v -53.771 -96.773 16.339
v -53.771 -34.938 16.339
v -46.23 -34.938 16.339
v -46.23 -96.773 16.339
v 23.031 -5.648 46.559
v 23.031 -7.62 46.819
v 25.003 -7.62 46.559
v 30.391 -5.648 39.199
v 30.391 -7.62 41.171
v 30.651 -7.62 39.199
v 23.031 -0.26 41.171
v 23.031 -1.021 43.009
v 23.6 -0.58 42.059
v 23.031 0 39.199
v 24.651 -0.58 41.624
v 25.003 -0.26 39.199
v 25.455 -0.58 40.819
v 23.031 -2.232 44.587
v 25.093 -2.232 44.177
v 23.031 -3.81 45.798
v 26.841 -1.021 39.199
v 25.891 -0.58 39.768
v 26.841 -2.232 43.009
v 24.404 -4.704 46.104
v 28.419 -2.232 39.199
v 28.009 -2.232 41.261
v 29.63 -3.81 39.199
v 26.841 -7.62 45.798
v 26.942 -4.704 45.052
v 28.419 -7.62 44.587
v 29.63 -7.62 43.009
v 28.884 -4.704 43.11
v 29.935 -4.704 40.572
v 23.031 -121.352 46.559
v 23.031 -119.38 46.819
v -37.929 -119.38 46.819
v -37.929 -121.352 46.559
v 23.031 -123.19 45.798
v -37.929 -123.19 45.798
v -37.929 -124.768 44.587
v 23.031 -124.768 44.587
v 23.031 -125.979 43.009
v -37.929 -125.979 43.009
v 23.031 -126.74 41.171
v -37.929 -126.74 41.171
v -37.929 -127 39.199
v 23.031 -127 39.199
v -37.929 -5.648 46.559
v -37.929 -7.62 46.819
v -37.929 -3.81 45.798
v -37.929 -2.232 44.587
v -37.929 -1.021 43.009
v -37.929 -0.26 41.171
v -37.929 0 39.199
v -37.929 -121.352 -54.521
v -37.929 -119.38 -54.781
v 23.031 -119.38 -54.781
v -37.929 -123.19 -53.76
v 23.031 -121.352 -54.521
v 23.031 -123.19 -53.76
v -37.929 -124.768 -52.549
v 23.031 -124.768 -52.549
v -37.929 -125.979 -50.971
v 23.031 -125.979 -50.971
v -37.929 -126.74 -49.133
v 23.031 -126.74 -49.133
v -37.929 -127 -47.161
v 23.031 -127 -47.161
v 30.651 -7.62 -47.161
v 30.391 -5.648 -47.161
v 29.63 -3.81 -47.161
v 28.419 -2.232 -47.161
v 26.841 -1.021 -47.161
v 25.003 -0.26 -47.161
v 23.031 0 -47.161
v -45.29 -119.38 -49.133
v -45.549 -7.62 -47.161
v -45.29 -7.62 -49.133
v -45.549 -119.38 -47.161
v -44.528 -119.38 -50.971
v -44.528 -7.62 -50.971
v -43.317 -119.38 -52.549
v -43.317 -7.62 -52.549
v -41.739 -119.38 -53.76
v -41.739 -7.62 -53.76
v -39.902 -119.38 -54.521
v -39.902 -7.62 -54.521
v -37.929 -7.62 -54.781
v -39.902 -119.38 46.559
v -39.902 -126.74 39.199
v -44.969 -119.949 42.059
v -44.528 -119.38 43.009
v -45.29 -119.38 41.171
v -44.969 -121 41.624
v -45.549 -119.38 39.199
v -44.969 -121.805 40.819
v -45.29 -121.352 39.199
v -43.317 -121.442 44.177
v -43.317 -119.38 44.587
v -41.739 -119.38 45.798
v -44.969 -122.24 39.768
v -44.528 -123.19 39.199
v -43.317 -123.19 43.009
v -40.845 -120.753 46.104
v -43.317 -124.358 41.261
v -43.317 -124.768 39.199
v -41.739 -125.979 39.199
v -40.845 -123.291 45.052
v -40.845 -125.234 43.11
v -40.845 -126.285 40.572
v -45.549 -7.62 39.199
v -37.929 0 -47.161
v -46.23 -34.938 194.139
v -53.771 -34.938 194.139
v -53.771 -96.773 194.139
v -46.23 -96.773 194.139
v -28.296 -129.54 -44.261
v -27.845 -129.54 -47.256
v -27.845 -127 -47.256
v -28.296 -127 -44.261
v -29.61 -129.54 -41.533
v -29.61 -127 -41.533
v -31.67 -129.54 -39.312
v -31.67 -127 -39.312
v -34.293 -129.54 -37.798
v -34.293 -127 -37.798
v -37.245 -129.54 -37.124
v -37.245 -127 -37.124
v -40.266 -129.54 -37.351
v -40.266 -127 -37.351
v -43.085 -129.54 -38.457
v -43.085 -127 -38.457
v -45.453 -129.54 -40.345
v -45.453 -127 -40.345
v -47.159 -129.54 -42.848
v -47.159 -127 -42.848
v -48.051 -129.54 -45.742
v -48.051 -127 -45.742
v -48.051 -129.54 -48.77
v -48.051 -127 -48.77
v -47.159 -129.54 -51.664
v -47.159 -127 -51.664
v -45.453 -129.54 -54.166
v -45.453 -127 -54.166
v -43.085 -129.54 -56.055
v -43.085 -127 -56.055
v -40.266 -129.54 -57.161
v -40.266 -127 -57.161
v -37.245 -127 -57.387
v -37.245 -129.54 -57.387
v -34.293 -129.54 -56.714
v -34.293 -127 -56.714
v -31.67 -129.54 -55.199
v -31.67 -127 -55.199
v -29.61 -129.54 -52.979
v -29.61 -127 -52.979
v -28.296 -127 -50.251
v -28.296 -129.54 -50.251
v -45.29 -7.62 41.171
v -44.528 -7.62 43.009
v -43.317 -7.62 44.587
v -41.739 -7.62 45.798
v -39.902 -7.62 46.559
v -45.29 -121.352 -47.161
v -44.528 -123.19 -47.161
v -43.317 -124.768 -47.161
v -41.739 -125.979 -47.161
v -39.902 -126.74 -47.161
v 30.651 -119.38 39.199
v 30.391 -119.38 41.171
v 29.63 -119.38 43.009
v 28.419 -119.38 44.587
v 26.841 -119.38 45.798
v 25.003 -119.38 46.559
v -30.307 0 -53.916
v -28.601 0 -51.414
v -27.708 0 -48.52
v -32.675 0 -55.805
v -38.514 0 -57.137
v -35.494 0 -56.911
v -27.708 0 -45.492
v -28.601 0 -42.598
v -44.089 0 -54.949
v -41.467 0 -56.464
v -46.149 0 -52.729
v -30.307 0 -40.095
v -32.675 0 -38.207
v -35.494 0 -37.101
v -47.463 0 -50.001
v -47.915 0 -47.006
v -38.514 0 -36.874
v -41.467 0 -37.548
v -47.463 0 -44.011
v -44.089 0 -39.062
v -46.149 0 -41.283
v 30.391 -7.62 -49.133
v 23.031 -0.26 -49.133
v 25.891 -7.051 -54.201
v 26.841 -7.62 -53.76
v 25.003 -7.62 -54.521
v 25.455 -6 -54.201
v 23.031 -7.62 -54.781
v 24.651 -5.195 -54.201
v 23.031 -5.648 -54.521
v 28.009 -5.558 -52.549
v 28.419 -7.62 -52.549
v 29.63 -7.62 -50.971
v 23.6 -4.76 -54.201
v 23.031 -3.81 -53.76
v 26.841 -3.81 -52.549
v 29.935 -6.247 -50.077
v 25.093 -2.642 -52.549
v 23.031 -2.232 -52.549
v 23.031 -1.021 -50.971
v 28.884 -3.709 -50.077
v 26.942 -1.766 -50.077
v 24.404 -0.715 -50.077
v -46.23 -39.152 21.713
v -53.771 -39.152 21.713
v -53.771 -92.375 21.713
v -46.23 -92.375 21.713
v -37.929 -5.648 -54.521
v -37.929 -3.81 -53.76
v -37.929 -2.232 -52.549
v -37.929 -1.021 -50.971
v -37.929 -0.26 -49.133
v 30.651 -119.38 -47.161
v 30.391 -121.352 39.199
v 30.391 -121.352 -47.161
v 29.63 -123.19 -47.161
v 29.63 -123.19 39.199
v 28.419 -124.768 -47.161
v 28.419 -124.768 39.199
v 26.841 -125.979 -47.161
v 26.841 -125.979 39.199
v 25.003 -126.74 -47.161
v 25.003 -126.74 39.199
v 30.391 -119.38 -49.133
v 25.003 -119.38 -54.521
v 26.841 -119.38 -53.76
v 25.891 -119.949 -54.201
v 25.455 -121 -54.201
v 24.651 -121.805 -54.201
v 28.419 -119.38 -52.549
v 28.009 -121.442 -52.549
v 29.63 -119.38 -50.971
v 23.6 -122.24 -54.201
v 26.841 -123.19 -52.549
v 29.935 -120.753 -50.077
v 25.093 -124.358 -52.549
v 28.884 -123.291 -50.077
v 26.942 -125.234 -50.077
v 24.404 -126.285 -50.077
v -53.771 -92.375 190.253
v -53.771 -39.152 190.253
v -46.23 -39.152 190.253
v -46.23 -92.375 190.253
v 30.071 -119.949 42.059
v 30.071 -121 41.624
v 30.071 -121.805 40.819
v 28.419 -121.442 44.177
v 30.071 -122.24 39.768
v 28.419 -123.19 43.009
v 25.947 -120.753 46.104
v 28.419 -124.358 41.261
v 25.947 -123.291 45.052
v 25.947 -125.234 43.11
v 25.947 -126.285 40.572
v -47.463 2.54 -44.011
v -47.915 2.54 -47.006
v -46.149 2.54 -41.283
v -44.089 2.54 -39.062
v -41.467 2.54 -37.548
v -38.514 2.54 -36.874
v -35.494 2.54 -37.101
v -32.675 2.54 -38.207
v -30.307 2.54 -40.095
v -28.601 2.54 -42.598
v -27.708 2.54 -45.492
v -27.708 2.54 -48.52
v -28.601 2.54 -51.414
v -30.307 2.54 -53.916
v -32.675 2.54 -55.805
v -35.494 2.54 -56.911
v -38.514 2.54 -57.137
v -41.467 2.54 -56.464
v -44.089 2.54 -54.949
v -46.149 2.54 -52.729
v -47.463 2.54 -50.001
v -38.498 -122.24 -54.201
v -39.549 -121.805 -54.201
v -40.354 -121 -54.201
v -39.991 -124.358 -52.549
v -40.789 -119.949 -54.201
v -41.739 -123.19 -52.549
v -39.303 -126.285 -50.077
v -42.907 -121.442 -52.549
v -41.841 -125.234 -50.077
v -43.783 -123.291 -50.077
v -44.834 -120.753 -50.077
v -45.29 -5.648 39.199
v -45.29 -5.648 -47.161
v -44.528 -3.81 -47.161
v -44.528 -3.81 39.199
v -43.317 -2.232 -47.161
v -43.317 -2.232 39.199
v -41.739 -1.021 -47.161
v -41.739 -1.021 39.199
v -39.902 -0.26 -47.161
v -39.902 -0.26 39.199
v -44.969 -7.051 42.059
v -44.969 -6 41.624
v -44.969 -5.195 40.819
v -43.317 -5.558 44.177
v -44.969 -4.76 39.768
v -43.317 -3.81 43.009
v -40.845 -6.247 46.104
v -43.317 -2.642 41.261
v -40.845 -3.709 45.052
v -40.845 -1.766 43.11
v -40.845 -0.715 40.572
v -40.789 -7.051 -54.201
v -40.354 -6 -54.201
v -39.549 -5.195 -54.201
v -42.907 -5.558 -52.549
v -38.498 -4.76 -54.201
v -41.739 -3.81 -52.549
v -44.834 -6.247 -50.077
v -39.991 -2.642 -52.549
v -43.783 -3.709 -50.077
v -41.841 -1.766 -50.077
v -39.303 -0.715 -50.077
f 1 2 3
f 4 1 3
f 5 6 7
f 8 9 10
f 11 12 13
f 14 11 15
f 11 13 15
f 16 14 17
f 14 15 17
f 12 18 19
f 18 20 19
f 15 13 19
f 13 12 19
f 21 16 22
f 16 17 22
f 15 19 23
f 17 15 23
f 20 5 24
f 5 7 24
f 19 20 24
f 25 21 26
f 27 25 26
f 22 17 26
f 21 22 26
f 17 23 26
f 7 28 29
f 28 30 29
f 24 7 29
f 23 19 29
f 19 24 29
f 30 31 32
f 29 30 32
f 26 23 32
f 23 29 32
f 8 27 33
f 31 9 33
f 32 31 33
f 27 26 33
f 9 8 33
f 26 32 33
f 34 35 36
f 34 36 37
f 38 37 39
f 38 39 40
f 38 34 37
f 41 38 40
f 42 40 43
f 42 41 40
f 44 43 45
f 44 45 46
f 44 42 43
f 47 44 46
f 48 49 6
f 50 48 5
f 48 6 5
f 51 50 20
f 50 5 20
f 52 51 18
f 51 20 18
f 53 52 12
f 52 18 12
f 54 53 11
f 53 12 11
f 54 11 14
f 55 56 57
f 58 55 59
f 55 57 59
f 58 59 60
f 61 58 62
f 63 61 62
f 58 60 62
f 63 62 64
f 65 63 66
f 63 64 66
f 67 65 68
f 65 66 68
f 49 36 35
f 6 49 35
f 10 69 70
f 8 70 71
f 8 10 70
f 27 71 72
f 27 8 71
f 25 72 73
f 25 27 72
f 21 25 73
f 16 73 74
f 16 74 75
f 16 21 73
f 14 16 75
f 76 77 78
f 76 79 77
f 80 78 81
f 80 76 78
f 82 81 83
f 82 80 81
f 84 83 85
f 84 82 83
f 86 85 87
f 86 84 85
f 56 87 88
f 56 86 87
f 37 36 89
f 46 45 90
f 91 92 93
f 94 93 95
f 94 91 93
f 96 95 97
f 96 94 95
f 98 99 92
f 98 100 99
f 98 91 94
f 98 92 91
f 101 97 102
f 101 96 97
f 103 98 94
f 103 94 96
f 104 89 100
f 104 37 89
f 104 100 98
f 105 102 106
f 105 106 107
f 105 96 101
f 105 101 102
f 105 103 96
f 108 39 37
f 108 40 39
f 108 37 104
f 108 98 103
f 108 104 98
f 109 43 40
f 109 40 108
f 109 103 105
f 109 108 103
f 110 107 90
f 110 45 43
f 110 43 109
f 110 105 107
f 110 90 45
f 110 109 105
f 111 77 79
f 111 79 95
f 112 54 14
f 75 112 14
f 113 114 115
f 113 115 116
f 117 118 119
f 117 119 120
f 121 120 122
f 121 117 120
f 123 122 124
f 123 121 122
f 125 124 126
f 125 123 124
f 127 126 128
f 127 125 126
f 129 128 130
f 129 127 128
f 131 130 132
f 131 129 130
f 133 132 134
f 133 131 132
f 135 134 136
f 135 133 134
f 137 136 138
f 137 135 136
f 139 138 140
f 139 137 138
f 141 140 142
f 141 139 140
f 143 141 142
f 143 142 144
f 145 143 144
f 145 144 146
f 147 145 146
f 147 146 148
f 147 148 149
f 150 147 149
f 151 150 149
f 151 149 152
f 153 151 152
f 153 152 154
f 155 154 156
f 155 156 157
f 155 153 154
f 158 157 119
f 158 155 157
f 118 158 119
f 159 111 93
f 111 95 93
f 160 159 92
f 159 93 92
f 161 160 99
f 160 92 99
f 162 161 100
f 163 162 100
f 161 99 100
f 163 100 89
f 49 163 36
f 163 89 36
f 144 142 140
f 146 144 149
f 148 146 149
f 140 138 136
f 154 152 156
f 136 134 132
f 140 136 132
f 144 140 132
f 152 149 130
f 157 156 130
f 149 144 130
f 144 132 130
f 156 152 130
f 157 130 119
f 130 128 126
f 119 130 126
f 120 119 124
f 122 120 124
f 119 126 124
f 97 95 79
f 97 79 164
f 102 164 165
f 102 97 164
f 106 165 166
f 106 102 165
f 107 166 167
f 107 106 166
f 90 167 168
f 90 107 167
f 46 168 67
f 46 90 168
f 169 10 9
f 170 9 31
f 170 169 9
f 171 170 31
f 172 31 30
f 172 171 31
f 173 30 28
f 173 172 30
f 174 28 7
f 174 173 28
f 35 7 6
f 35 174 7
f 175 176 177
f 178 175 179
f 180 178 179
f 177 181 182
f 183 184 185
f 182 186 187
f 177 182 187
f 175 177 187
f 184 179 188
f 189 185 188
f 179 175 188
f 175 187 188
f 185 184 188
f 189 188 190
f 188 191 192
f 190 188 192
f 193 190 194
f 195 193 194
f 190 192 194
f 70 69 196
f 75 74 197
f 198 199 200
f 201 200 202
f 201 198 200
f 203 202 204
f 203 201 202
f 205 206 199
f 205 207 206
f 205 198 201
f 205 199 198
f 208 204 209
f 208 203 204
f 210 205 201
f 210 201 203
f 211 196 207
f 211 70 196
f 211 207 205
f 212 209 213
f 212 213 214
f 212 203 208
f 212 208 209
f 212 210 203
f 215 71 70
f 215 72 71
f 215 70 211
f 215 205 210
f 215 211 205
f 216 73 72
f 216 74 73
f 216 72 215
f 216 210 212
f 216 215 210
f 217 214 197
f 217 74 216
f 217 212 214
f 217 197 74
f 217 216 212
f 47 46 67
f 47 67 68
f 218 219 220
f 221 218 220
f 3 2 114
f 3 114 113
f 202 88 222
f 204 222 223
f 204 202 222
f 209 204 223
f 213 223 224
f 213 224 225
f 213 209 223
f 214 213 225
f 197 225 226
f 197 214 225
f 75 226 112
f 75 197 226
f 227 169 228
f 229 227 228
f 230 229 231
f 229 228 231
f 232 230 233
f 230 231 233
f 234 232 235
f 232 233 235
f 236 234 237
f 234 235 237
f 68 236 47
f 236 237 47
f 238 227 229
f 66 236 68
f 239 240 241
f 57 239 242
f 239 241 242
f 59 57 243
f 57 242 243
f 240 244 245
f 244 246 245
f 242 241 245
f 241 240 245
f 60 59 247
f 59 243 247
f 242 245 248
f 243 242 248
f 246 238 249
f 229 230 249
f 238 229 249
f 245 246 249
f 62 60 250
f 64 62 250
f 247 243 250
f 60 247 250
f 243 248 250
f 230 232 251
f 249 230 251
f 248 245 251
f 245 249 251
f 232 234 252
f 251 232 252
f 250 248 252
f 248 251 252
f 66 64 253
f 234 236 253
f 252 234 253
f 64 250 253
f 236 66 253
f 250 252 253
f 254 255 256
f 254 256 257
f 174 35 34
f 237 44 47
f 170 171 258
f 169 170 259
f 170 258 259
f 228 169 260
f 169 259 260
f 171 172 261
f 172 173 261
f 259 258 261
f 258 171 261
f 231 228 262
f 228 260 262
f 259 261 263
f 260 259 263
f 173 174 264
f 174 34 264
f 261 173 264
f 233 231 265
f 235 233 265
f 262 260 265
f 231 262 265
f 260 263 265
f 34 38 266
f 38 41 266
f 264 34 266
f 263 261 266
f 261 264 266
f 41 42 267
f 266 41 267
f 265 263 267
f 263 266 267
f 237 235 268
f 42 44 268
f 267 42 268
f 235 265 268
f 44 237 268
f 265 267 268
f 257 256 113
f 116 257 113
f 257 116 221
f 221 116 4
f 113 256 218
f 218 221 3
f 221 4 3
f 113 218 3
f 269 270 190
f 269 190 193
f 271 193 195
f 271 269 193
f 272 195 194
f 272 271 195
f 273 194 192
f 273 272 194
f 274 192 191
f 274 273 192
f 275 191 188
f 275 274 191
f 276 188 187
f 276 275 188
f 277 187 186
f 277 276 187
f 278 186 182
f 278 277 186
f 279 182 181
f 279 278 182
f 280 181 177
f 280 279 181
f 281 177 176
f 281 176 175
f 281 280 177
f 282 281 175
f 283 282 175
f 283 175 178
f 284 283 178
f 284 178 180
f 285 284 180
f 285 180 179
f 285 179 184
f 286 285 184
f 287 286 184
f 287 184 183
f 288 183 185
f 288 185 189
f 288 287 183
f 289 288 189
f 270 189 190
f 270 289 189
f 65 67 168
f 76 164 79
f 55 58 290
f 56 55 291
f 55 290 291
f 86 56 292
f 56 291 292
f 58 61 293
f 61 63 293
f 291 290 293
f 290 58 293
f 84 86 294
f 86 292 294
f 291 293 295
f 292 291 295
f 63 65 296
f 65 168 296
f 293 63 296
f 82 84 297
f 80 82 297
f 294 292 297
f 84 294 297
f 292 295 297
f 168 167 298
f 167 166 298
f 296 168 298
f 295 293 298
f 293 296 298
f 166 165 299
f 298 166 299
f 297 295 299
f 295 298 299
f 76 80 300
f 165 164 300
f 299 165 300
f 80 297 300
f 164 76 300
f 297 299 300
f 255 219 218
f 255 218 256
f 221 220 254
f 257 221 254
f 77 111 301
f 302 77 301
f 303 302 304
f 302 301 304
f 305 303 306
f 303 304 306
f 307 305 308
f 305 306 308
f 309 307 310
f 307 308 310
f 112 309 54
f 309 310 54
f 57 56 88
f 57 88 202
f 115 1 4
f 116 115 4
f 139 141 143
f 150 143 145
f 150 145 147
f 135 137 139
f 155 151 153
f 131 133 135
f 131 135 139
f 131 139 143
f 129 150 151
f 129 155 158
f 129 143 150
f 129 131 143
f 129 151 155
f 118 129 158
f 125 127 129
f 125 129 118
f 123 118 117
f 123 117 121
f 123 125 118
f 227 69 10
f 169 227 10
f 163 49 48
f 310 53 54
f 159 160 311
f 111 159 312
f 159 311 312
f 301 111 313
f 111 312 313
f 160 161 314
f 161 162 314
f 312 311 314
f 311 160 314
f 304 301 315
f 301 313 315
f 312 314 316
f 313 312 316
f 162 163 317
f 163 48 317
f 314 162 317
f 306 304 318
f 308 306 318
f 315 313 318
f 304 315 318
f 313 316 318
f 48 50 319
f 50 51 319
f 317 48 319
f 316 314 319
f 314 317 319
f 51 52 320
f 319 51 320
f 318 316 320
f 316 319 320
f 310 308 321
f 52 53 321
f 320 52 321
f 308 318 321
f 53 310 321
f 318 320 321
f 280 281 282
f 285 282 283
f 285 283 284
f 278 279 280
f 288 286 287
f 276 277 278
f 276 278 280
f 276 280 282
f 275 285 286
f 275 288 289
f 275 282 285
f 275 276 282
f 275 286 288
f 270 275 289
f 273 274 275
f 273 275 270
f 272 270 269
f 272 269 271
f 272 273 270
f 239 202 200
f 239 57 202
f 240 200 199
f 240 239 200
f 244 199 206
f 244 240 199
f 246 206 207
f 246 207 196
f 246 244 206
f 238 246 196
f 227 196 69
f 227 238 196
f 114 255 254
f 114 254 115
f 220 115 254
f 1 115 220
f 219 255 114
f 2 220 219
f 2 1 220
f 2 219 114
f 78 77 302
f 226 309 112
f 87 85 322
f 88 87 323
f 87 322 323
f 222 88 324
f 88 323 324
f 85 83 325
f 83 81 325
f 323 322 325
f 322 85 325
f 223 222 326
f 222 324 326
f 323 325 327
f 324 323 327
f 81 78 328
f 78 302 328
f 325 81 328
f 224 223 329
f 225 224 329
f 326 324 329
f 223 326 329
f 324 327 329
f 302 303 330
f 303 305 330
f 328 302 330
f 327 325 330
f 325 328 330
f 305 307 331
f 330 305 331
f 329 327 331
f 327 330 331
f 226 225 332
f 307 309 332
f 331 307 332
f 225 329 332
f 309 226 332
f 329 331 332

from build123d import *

# Parameters (mm, degrees)
F0_W      = 76.2
F0_H      = 101.6
F1_DEPTH  = 127
F2_R      = 7.62
F4_R      = 10.16
F5_DEPTH  = 2.54
F7_R      = 10.16
F8_DEPTH  = 2.54
F10_W     = 7.5408555567
F10_H     = 61.8350096047
F11_DEPTH = 177.8
F12_W     = 53.2229803503
F12_H     = 168.5394383967
F13_DEPTH = 7.5408555567


with BuildPart() as f1:
    # F0 (on Front) → F1 (new body)
    with BuildSketch(Plane.XZ):
        with Locations((-7.4493430227, -3.9810621095)):
            Rectangle(F0_W, F0_H)
    extrude(amount=F1_DEPTH)

    # F2
    f2_edges = [f1.edges().sort_by_distance(p)[0] for p in [
        (-7.449343, -127, 46.818938),
        (30.650657, -63.5, 46.818938),
        (-7.449343, 0, 46.818938),
        (-45.549343, -63.5, 46.818938),
        (-45.549343, -127, -3.981062),
        (30.650657, -127, -3.981062),
        (30.650657, 0, -3.981062),
        (30.650657, -63.5, -54.781062),
        (-7.449343, -127, -54.781062),
        (-45.549343, 0, -3.981062),
        (-45.549343, -63.5, -54.781062),
        (-7.449343, 0, -54.781062),
    ]]
    fillet(f2_edges, radius=F2_R)


with BuildPart() as f5:
    # F4 (on offset) → F5 (new body)
    with BuildSketch(Plane.XZ.offset(129.54)):
        with Locations((-38.0047485232, -47.2559072077)):
            Circle(F4_R)
    extrude(amount=-F5_DEPTH)


with BuildPart() as f8:
    # F7 (on offset) → F8 (new body)
    with BuildSketch(Plane(origin=(0, 2.54, 0), x_dir=(-1, 0, 0), z_dir=(0, 1, 0))):
        with Locations((37.7547219396, -47.0058731735)):
            Circle(F7_R)
    extrude(amount=-F8_DEPTH)


with BuildPart() as f11:
    # F10 (on offset) → F11 (new body)
    with BuildSketch(Plane.XY.offset(16.3389378905)):
        with Locations((-50.0002782792, -65.8553447574)):
            Rectangle(F10_W, F10_H)
    extrude(amount=F11_DEPTH)

    # F12 (on face) → F13 (cut, through all)
    with BuildSketch(Plane(origin=(-53.7707060575, 0, 0), x_dir=(0, -1, 0), z_dir=(-1, 0, 0))):
        with Locations((65.7632816583, 105.9831064194)):
            Rectangle(F12_W, F12_H)
    extrude(amount=-F13_DEPTH, mode=Mode.SUBTRACT)


solid = Compound([f1.part, f5.part, f8.part, f11.part])
